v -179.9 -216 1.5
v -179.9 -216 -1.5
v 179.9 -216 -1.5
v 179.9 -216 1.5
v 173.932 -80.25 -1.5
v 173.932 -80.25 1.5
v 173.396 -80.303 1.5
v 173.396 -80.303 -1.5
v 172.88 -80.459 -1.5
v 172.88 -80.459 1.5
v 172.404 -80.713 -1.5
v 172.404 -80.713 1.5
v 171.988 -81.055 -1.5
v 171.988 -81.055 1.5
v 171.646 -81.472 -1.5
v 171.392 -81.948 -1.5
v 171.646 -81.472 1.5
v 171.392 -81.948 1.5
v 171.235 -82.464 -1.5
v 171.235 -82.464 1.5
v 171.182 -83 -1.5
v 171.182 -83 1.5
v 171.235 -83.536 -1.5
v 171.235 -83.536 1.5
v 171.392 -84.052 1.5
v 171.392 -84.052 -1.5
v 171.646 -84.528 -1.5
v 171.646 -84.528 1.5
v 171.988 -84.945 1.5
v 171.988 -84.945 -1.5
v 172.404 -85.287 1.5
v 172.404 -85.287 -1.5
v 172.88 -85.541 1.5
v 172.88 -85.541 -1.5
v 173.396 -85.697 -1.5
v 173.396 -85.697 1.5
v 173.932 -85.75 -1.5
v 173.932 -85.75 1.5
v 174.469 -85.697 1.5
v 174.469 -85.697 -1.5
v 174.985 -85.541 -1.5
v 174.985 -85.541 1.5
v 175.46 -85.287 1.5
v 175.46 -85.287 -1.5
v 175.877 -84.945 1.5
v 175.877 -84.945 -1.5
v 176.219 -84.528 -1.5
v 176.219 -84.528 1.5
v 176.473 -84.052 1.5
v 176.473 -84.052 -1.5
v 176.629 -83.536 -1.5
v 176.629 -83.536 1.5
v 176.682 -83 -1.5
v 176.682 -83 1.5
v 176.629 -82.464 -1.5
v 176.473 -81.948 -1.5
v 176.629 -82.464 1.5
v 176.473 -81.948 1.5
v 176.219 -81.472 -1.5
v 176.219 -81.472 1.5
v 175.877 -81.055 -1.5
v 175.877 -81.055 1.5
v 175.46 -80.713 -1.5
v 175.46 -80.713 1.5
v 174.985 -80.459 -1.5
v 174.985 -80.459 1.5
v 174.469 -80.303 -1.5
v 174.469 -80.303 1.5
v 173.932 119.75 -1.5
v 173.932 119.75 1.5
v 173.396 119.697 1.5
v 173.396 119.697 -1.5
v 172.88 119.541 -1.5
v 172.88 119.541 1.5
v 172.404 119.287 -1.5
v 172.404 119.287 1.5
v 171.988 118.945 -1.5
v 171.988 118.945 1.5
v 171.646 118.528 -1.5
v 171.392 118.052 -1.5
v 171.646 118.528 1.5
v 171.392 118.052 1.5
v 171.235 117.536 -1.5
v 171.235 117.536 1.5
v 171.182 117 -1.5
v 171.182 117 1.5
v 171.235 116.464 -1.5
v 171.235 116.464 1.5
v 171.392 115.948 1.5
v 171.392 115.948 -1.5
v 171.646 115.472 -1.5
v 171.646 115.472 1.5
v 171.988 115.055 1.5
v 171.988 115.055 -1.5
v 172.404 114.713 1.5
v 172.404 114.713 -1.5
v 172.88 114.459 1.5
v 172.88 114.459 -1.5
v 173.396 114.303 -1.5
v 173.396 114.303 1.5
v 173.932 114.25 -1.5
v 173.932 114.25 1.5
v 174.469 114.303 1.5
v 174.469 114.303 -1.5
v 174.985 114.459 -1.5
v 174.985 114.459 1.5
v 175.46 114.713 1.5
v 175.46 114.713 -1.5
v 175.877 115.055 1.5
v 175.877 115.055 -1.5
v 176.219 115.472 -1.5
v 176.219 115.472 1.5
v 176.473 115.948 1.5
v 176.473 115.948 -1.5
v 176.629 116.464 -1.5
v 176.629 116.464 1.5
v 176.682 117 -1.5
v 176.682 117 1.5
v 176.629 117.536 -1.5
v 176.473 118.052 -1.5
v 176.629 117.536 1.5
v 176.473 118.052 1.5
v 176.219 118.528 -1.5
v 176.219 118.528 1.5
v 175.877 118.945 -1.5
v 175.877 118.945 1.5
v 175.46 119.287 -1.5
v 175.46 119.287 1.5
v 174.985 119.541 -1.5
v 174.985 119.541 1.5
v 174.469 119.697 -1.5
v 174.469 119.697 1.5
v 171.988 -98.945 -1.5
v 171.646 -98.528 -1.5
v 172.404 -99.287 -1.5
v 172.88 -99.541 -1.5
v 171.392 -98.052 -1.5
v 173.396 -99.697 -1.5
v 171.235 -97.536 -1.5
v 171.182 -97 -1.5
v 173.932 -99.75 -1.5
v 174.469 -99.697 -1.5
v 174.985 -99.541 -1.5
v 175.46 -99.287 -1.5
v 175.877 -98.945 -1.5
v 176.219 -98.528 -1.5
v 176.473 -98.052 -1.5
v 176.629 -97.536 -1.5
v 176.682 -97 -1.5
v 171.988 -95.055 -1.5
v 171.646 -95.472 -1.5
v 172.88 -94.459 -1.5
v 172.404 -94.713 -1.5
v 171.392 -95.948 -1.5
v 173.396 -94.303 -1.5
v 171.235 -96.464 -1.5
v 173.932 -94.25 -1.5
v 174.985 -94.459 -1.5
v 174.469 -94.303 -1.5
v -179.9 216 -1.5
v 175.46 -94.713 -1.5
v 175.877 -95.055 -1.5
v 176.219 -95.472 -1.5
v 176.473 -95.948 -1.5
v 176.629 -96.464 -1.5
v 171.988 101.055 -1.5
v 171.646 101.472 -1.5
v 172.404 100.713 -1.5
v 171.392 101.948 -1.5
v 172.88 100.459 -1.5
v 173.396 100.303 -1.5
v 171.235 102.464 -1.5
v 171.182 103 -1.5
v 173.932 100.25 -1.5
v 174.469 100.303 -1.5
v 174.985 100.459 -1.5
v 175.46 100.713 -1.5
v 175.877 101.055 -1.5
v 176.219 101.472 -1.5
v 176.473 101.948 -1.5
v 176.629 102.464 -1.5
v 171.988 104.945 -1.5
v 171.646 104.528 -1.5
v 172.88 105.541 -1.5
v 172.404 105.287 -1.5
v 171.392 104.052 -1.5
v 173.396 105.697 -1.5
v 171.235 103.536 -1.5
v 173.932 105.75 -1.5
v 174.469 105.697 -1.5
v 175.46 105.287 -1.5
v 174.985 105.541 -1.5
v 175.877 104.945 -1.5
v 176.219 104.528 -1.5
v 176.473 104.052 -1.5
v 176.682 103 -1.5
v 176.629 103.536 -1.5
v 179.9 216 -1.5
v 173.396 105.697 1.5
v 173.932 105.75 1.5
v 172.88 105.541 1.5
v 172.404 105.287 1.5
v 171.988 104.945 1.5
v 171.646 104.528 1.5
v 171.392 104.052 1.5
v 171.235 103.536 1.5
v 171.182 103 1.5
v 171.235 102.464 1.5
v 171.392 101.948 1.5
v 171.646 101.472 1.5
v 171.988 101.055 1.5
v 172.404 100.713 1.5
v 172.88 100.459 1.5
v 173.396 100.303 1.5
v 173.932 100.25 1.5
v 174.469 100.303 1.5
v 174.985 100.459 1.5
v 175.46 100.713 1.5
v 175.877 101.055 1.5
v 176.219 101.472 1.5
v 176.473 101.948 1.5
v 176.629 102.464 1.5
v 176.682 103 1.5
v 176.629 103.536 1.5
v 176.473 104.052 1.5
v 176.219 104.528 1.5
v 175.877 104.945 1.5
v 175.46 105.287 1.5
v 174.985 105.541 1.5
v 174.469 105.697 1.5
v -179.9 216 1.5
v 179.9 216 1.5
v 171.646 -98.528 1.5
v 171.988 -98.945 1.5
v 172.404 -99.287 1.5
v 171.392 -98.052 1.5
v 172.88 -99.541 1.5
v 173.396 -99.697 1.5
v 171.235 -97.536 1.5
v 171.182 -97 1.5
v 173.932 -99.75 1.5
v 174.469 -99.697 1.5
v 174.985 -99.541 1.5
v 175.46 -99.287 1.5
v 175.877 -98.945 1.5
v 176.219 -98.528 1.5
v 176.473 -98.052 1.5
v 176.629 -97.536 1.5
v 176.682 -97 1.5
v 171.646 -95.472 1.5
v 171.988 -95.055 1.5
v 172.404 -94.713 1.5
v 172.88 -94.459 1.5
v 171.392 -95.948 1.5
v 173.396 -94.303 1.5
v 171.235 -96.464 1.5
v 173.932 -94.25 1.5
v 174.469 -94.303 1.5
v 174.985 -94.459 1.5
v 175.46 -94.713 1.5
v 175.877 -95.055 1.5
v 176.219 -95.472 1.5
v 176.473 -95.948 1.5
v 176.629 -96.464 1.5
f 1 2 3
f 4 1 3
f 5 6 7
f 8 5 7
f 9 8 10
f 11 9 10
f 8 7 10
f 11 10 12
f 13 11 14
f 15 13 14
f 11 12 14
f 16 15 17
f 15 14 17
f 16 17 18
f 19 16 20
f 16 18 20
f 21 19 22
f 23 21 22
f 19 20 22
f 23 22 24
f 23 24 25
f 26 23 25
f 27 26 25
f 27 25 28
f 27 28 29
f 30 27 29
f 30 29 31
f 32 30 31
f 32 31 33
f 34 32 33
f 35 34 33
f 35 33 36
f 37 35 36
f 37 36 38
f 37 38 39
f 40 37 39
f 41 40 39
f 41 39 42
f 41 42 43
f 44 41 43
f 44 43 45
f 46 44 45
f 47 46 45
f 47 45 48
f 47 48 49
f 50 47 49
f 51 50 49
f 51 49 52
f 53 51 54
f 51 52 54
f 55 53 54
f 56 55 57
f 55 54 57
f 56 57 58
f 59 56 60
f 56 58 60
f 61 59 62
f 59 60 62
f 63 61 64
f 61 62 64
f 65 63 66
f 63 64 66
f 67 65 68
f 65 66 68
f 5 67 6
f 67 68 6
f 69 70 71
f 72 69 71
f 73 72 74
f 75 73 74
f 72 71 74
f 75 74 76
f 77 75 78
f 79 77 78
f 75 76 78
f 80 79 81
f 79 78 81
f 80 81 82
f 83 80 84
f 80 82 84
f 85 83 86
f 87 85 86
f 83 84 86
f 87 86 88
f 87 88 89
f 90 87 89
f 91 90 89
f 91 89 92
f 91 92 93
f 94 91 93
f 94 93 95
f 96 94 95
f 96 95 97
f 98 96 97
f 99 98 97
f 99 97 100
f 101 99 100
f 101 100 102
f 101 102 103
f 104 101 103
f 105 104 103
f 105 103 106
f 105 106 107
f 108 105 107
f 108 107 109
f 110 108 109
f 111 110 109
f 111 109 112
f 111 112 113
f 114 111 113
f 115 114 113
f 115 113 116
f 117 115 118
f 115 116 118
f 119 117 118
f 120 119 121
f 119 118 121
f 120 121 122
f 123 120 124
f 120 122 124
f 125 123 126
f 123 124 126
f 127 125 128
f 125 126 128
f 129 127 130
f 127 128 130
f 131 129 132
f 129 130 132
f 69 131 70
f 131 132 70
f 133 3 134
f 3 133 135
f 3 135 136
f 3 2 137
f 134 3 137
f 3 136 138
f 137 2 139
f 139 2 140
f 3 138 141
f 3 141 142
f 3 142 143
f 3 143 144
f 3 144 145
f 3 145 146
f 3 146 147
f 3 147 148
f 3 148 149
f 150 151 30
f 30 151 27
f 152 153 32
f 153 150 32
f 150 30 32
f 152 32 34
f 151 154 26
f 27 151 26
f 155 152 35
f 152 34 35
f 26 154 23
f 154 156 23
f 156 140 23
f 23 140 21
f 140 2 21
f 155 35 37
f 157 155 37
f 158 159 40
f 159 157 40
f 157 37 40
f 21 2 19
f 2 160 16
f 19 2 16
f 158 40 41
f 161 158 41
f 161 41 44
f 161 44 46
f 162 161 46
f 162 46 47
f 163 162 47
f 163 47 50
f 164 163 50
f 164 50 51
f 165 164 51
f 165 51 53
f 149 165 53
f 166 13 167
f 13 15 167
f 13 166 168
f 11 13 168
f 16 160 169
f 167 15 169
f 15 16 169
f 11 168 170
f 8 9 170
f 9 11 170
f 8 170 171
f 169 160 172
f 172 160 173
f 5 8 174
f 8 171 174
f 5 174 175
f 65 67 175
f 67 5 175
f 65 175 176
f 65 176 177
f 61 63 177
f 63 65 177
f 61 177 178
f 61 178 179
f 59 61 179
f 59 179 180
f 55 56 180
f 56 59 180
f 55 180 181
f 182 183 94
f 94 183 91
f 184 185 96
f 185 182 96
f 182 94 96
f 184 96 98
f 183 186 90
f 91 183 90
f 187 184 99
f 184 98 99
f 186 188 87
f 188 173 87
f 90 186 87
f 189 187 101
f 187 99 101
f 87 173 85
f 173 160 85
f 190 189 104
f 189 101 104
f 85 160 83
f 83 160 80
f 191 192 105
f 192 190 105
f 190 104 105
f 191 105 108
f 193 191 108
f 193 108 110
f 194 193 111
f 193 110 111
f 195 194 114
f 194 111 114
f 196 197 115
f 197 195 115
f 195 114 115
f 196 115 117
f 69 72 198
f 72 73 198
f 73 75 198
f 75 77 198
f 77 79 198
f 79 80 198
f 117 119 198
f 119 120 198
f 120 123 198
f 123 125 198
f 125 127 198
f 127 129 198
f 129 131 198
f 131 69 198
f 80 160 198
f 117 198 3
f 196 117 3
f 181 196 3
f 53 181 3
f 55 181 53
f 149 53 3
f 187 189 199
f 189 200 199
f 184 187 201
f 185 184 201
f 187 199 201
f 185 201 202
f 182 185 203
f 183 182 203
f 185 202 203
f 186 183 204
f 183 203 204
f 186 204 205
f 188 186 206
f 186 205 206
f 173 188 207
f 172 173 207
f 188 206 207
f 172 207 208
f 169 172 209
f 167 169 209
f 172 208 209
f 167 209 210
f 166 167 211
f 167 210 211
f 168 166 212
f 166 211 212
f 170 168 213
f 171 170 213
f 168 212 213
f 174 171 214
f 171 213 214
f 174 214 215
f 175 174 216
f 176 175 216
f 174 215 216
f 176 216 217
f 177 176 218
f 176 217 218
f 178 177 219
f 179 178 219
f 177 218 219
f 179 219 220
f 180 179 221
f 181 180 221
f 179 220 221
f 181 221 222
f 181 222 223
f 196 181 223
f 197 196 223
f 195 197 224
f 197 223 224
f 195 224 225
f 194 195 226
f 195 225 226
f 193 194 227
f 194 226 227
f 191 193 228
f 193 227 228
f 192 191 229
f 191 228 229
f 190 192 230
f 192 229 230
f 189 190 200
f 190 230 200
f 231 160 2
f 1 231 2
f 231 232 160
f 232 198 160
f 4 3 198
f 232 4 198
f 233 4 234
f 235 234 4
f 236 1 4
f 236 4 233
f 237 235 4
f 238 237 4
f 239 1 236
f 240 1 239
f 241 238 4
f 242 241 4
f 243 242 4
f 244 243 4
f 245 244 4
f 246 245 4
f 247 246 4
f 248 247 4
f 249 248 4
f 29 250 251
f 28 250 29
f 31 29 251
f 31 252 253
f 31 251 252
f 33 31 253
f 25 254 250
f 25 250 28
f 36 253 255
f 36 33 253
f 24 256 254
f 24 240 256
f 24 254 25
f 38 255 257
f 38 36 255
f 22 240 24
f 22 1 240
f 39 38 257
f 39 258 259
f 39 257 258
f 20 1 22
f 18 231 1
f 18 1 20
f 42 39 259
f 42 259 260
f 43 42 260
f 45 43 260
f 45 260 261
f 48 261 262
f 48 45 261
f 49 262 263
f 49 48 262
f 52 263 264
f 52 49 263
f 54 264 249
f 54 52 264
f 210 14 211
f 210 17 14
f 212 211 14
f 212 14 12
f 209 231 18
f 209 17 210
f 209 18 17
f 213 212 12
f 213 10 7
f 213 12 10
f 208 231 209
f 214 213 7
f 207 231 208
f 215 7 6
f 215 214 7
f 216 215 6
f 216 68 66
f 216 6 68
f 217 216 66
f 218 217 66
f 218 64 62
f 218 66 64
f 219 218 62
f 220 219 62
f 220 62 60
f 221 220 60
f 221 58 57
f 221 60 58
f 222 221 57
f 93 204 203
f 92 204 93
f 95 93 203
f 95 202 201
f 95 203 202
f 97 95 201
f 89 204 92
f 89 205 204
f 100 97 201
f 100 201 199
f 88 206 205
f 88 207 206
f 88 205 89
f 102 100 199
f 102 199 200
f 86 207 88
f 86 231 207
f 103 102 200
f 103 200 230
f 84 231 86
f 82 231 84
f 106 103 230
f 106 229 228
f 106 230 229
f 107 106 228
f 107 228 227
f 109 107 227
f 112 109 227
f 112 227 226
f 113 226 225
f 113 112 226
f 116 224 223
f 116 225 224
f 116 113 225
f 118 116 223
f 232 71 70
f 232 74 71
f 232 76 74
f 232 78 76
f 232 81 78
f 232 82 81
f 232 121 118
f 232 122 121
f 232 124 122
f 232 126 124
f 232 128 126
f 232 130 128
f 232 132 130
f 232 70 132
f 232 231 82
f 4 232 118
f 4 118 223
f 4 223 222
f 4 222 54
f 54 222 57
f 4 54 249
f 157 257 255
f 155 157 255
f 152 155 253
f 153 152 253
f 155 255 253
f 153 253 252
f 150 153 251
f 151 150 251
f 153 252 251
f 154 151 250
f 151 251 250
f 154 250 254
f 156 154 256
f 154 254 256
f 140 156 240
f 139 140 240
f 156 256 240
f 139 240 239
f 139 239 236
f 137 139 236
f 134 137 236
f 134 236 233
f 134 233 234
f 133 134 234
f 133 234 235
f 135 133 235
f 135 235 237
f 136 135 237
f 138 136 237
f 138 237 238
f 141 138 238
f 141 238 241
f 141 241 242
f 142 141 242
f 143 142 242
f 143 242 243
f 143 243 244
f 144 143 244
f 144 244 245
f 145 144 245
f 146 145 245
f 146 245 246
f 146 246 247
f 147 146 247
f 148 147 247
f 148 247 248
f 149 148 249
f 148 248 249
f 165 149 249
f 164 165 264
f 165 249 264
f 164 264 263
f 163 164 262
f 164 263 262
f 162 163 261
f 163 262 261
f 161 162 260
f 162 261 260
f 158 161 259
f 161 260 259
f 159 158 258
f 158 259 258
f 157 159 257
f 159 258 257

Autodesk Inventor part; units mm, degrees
ref_plane "YZ Plane" through (0, 0, 0) normal (1, 0, 0) x (0, 1, 0)
ref_plane "XZ Plane" through (0, 0, 0) normal (0, 1, 0) x (-1, 0, 0)
ref_plane "XY Plane" through (0, 0, 0) normal (0, 0, 1) x (1, 0, 0)
sketch "Esquisse1" plane through (0, 0, 0) normal (0, 0, 1) x (1, 0, 0)
  line L0 (-179.9, -216) -> (179.9, -216)
  line L1 (179.9, -216) -> (179.9, 216)
  line L2 (179.9, 216) -> (-179.9, 216)
  line L3 (-179.9, 216) -> (-179.9, -216)
  line L4 (-179.9, -216) -> (179.9, 216) construction
  line L5 (179.9, -216) -> (-179.9, 216) construction
  point P0 (0, 0)
  dimension "Largueur_porte" = 359.8
  dimension "Hauteur_porte" = 432
extrude "Embase" add sketch "Esquisse1" along normal mid plane 3
sketch "Esquisse2" plane through (0, 0, -1.5) normal (0, 0, -1) x (-1, 0, 0)
  ellipse E0 centre (-178.8362, -97) end of major axis (-178.8362, -94.5) minor radius 1.7678 projected
  ellipse E1 centre (-178.8362, -83) end of major axis (-178.8362, -80.5) minor radius 1.7678 projected
  ellipse E2 centre (-178.8362, 117) end of major axis (-178.8362, 119.5) minor radius 1.7678 projected
  ellipse E3 centre (-178.8362, 103) end of major axis (-178.8362, 105.5) minor radius 1.7678 projected
  point P0 (0, 0)
  point P1 (-173.9322, 117)
  point P2 (-173.9322, 103)
  point P3 (-173.9322, -83)
  point P4 (-173.9322, -97)
hole "Perçage1" at (173.9322, 117, -1.5) at (173.9322, 103, -1.5) at (173.9322, -83, -1.5) at (173.9322, -97, -1.5) direction (0, 0, 1) diameter 5.5 end through all clearance for "Vis à tête plate fraisée ISO 2009/7046" size "M5" standard "ISO"
properties part number "Porte" material "Plastique PMMA"
